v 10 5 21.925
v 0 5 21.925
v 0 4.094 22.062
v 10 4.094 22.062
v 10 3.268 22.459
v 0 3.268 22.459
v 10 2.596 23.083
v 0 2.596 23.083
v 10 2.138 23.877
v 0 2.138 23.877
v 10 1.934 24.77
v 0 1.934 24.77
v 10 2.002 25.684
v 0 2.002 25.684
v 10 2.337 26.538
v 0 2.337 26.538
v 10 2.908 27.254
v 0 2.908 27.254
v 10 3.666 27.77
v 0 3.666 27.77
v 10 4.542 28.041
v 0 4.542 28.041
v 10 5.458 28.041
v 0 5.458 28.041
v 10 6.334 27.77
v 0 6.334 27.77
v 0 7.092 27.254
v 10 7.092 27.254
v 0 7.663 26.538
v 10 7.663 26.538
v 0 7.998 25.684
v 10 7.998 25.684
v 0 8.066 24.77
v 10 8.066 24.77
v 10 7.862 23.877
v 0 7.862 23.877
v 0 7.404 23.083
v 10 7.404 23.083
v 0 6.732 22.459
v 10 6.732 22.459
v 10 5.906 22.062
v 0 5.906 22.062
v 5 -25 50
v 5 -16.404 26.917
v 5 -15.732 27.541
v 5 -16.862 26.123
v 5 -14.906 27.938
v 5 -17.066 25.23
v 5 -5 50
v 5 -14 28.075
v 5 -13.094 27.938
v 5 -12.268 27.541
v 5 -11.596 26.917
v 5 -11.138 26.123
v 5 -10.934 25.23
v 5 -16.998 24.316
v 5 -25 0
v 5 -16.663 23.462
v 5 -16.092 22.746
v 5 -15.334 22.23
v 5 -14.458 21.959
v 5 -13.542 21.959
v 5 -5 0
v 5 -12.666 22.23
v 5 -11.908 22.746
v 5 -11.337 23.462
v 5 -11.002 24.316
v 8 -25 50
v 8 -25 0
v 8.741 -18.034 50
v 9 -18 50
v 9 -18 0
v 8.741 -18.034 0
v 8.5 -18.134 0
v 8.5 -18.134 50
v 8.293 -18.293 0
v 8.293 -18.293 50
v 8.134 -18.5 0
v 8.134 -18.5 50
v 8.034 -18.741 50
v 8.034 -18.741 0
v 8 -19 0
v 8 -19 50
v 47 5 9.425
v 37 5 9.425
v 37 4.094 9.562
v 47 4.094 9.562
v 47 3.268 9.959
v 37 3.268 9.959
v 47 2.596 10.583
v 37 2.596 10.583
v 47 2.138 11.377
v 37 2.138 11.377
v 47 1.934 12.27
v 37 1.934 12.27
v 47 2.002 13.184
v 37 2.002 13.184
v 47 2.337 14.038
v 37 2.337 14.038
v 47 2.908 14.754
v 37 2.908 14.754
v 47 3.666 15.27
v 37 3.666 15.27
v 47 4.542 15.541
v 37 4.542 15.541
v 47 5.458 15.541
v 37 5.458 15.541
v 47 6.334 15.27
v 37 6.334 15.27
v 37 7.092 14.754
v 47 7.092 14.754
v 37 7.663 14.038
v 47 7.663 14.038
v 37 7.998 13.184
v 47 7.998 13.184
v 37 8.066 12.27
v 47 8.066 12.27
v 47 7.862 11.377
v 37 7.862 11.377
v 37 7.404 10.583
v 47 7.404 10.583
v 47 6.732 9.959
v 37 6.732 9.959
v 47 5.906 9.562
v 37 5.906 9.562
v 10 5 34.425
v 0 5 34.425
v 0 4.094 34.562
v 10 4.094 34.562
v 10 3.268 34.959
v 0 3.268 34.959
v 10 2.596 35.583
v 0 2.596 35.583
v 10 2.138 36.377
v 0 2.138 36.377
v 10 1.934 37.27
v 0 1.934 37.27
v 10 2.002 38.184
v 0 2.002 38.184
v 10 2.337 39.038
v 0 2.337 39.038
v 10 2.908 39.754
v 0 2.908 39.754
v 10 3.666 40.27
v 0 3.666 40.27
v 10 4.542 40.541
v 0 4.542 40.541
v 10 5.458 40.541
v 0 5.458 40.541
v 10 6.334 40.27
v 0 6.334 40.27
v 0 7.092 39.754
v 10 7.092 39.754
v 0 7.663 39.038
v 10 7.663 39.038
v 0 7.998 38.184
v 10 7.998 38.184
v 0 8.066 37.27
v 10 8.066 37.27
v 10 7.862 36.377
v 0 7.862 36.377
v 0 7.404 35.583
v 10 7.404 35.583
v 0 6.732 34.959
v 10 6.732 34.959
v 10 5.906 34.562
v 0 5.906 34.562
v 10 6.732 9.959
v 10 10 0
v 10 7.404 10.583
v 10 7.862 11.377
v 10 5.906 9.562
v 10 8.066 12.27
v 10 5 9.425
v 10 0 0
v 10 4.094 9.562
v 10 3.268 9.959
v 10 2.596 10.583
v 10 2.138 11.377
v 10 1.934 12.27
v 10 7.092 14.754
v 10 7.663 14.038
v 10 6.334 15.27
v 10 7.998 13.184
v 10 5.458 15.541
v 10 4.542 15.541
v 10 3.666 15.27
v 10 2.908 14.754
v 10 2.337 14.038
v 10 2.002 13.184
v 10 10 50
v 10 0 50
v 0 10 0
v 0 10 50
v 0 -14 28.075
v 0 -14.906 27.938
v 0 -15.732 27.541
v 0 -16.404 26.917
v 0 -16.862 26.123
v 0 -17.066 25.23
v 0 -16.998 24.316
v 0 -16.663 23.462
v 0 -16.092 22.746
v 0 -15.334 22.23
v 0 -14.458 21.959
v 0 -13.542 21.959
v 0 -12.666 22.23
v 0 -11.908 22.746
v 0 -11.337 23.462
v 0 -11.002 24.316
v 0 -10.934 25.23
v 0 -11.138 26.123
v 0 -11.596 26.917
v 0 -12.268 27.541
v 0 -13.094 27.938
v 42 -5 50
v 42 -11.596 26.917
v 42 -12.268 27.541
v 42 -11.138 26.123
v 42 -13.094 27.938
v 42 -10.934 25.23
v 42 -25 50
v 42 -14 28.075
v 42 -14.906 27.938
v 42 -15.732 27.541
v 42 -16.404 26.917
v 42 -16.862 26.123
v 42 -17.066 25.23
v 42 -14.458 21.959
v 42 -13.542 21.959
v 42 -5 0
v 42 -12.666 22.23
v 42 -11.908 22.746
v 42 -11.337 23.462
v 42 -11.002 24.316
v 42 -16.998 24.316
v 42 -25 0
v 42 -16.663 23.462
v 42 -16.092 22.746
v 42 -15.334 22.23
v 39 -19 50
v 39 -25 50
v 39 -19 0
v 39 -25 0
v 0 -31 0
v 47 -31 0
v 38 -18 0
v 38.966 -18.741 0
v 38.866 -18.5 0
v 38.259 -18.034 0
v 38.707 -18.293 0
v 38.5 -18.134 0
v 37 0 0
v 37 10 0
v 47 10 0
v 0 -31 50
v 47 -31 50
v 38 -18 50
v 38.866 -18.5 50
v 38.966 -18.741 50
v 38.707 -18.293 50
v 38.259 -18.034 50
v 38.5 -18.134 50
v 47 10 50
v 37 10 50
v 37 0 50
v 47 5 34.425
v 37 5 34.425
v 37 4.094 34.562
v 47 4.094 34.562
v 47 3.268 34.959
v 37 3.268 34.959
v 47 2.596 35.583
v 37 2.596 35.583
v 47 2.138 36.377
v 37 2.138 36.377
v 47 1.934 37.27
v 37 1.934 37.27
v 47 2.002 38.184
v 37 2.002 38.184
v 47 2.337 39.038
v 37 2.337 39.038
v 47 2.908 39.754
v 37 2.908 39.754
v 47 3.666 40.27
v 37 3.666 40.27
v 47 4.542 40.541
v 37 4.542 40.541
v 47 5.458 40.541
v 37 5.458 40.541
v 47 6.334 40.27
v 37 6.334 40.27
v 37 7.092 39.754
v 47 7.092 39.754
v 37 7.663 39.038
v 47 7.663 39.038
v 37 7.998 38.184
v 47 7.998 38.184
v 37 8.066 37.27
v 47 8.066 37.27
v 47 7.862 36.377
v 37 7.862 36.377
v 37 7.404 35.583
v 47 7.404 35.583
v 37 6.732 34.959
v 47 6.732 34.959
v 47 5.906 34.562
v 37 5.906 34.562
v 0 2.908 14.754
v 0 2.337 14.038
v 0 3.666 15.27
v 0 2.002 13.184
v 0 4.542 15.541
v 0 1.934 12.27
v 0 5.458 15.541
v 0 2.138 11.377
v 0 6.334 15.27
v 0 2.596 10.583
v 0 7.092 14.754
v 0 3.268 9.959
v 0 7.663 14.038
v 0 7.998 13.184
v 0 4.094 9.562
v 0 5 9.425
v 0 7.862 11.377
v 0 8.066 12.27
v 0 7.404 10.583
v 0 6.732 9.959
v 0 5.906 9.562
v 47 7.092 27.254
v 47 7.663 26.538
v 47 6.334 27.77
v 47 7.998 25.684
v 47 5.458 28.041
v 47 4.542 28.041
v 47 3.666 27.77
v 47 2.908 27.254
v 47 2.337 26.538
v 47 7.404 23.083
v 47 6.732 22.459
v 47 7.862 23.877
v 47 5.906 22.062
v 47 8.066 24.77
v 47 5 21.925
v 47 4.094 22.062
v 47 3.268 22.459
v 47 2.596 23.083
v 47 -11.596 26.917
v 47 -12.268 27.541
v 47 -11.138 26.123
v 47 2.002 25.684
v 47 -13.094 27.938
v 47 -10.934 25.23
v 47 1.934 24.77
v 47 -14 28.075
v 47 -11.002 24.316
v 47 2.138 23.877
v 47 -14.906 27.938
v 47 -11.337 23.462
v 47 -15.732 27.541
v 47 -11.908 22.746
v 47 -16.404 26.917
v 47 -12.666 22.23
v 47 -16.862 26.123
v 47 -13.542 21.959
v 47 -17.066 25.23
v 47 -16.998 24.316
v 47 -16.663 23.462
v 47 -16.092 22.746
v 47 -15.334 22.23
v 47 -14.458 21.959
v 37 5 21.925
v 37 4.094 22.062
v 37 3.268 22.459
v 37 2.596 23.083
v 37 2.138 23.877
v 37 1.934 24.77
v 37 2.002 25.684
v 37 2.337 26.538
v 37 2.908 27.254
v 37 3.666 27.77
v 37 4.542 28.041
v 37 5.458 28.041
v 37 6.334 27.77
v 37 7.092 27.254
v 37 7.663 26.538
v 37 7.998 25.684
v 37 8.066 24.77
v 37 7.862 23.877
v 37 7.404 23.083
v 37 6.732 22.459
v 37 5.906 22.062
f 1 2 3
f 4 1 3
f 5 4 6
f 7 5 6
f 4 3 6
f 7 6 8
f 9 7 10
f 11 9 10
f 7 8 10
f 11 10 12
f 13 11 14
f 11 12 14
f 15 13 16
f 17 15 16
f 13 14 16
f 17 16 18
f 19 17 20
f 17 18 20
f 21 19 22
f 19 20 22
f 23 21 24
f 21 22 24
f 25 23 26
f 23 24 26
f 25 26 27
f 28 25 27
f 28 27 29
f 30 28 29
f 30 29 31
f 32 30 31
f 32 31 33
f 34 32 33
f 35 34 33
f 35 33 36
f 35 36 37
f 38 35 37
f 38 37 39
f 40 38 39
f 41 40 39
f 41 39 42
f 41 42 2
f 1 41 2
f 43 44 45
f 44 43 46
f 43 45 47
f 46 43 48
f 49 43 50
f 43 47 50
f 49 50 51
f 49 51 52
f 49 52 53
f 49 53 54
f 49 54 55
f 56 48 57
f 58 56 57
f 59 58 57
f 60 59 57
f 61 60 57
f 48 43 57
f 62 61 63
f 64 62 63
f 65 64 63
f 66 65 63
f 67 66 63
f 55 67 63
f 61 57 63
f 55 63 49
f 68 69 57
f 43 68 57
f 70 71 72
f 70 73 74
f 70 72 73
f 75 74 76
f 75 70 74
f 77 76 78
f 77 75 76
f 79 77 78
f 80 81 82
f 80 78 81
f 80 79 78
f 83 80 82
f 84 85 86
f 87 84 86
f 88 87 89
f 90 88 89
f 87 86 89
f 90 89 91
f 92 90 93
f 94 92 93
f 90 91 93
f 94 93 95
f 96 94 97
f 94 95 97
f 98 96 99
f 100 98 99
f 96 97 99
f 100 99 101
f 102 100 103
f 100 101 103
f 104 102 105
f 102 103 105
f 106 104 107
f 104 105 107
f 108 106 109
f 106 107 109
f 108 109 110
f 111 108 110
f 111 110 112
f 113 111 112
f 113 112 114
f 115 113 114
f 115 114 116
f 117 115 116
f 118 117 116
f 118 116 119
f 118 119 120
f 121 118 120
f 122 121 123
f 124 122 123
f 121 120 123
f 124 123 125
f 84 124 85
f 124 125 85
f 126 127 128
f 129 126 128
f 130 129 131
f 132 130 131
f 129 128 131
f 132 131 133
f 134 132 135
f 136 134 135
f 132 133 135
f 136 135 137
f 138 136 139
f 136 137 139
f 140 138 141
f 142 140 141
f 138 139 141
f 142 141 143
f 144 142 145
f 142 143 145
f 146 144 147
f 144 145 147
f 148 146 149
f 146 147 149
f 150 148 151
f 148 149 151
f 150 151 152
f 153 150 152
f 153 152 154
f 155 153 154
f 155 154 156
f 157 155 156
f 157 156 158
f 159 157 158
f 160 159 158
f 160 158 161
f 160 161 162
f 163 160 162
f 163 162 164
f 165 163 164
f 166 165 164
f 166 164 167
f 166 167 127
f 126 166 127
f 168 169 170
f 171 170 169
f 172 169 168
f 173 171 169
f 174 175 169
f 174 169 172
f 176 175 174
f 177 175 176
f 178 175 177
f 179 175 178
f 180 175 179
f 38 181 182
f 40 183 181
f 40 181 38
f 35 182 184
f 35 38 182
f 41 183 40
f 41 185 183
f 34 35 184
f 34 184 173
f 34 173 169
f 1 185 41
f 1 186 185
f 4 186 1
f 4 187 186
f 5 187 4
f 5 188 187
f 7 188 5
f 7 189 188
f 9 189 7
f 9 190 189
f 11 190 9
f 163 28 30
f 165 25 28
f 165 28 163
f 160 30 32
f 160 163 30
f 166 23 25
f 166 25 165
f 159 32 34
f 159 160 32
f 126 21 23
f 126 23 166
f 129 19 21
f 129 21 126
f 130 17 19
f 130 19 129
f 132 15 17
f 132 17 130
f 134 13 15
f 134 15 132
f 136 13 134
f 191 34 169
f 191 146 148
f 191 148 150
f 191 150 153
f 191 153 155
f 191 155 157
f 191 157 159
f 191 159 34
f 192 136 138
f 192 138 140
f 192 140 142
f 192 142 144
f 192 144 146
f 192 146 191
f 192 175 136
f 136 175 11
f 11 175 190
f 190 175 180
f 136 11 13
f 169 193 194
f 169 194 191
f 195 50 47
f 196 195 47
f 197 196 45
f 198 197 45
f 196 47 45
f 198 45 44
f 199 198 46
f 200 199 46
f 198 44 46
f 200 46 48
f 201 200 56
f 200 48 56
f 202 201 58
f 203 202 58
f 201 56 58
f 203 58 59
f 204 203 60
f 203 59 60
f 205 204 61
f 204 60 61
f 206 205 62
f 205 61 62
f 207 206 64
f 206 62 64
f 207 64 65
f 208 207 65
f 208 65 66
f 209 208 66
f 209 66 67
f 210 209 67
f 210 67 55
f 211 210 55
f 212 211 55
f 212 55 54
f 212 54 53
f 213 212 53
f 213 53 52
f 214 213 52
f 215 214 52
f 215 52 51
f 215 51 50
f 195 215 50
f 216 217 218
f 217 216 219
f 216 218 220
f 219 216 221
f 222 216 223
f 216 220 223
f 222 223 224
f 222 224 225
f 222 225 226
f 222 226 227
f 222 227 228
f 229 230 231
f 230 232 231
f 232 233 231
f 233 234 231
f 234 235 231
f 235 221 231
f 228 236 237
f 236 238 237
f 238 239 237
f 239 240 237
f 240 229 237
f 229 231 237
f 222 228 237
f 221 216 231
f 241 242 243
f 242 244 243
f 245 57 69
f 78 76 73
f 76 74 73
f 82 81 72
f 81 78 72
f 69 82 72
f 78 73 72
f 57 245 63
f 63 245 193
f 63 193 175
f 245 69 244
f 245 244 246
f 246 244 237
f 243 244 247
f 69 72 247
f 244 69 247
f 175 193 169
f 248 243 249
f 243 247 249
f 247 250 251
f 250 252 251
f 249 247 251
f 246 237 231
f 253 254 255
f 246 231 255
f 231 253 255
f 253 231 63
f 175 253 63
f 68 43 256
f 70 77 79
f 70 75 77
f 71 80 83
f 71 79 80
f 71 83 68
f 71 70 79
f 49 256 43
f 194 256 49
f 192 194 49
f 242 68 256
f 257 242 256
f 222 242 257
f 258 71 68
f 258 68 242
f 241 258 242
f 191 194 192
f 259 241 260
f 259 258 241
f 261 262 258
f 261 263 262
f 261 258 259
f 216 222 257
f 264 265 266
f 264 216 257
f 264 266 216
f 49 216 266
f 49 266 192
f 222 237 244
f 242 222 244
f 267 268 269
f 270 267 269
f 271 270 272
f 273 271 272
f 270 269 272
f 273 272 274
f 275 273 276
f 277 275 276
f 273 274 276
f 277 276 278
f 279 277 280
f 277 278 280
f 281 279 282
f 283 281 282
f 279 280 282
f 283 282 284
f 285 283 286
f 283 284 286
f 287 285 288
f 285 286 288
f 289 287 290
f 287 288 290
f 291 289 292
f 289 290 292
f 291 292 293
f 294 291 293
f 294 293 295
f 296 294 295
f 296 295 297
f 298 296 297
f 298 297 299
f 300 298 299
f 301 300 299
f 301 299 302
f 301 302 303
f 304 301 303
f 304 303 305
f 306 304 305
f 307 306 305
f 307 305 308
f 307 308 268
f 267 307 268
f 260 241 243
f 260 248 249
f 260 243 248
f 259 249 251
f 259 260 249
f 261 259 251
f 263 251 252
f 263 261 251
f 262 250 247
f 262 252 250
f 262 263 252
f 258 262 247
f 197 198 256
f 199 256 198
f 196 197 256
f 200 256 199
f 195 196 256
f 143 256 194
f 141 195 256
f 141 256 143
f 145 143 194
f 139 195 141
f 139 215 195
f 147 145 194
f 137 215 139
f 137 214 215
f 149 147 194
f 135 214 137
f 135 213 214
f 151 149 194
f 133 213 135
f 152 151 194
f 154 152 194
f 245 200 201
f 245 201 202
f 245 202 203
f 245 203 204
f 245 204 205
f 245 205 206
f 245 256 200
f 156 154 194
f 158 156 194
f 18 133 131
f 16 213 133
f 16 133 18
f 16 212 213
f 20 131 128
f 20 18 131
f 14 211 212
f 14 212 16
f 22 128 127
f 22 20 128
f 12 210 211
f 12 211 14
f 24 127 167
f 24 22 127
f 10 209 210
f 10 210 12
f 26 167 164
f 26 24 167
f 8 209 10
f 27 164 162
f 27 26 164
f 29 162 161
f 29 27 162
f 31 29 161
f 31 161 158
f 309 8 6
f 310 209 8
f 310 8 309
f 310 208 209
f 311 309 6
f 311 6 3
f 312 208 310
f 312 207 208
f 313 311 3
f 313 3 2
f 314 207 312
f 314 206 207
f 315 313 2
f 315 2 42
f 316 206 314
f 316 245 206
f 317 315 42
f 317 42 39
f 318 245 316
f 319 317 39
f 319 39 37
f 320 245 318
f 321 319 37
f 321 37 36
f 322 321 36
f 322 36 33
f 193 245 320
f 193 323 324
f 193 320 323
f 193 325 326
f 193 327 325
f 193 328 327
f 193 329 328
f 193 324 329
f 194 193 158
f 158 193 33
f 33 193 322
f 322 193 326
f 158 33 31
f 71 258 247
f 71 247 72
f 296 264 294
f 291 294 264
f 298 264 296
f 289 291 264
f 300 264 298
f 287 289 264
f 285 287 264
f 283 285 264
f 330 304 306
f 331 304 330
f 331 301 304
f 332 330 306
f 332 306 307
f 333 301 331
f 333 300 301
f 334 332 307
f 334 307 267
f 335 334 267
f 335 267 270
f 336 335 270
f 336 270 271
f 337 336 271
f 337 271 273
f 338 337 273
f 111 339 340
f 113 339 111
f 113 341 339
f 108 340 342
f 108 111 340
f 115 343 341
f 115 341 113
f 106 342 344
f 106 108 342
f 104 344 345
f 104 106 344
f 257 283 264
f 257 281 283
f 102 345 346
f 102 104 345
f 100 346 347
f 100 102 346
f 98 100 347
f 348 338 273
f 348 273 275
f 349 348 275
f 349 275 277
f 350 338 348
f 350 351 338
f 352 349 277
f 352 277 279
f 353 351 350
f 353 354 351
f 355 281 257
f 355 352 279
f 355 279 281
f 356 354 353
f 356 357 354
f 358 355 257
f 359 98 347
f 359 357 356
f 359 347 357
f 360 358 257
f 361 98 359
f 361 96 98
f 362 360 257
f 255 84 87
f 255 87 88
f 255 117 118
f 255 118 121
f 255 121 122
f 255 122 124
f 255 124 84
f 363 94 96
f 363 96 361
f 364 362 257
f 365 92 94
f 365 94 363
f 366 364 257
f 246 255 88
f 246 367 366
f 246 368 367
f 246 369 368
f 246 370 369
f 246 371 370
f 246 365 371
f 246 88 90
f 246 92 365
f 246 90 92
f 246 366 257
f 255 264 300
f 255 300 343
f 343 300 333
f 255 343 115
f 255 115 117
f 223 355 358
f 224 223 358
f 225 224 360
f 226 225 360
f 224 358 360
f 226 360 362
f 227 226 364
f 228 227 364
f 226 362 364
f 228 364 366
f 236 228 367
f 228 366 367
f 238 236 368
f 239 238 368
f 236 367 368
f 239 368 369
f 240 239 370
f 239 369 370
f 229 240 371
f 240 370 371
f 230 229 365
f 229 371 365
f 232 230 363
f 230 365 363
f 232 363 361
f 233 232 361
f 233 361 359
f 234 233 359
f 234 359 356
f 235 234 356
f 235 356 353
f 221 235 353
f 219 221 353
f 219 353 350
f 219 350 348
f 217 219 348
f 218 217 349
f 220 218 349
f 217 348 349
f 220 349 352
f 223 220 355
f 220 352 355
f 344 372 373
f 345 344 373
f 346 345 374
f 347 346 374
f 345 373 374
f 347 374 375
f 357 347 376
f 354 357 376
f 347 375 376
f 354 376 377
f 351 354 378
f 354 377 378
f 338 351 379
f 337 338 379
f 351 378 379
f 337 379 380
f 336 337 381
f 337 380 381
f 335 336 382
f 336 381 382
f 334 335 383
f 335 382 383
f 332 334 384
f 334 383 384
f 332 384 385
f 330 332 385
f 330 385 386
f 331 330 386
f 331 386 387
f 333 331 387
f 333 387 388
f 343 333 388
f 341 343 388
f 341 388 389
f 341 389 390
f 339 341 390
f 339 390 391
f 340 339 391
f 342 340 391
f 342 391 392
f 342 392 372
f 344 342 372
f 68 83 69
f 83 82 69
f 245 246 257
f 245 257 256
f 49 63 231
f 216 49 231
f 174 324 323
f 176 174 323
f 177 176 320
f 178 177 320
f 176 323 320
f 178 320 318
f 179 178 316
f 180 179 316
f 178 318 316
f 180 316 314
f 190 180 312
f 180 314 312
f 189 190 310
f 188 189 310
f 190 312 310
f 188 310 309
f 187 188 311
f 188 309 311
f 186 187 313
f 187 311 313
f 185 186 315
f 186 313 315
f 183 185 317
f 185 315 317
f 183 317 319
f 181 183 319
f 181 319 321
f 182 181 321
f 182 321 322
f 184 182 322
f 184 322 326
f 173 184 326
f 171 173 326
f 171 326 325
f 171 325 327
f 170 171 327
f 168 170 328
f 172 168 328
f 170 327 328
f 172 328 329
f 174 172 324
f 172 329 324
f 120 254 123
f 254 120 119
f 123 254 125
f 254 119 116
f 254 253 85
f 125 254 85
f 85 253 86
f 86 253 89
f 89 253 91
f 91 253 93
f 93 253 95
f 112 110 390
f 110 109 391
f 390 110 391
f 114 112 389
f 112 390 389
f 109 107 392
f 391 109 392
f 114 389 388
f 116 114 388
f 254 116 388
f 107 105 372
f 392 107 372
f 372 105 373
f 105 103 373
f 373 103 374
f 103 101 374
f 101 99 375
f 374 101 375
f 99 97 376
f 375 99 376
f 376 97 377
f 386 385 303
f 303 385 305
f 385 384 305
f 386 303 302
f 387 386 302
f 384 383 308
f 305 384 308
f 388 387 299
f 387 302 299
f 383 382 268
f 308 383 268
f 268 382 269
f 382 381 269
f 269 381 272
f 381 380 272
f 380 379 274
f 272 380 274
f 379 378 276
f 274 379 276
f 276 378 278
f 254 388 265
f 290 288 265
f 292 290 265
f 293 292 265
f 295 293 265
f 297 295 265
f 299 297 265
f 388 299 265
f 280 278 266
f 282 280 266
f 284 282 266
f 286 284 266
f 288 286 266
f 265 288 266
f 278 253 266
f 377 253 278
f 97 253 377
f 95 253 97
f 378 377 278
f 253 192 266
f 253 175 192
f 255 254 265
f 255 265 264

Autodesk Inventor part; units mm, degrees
sketch "Skizze1" plane through (0, 0, 0) normal (0, 0, 1) x (1, 0, 0)
  line L0 (-9.4, 0) -> (56.4, 0) projected
  line L1 (0, -37.2) -> (0, 6.2) projected
  line L2 (0, 0) -> (47, 0)
  line L3 (47, 0) -> (47, -31)
  line L4 (47, -31) -> (0, -31)
  line L5 (0, -31) -> (0, 0)
  line L6 (5, -5) -> (42, -5)
  line L7 (42, -5) -> (42, -25)
  line L8 (42, -25) -> (39, -25)
  line L9 (39, -25) -> (39, -18)
  line L10 (39, -18) -> (8, -18)
  line L11 (8, -18) -> (8, -25)
  line L12 (8, -25) -> (5, -25)
  line L13 (5, -25) -> (5, -5)
  dimension "d0" = 47
  dimension "d1" = 31
  dimension "d2" = 5
  dimension "d3" = 5
  dimension "d4" = 5
  dimension "d5" = 6
  dimension "d6" = 6
  dimension "d7" = 3
  dimension "d8" = 3
  dimension "d9" = 13
extrude "Extrusion1" add sketch "Skizze1" along normal blind 50
fillet "Rundung1" radius 1 2 edges at (8, -18, 25) (39, -18, 25)
sketch "Skizze4" plane through (0, -31, 0) normal (-1, 0, 0) x (0, 0, 1)
  line L0 (50, 31) -> (50, 0) projected
  line L1 (0, 31) -> (50, 31) projected
  circle A0 centre (25, 17) radius 1.8
  dimension "d41" = 25
  dimension "d42" = 14
  dimension "d43" = 3.6
hole "Bohrung3" at (0, -14, 25) direction (1, 0, 0) diameter 6.15 end through all
sketch "Skizze5" plane through (0, 0, 0) normal (0, 1, 0) x (1, 0, 0)
  line L0 (0, 0) -> (47, 0) projected
  line L1 (0, 0) -> (10, 0)
  line L2 (10, 0) -> (10, -50)
  line L3 (10, -50) -> (0, -50)
  line L4 (0, -50) -> (0, 0)
  line L5 (47, 0) -> (47, -50) projected
  line L6 (47, 0) -> (37, 0)
  line L7 (37, 0) -> (37, -50)
  line L8 (37, -50) -> (47, -50)
  line L9 (47, -50) -> (47, 0)
  dimension "d51" = 10
  dimension "d52" = 50
  dimension "d53" = 10
  dimension "d54" = 50
extrude "Extrusion4" add sketch "Skizze5" along normal blind 10
sketch "Skizze6" plane through (47, -31, 50) normal (1, 0, 0) x (0, 0, -1)
  line L0 (0, 41) -> (50, 41) projected
  line L1 (50, 41) -> (50, 0) projected
  line L2 (0, 0) -> (0, 41) projected
  point P0 (50, 31)
  point P1 (12.5, 36)
  point P2 (25, 36)
  point P3 (37.5, 36)
  dimension "d57" = 5
  dimension "d58" = 5
  dimension "d59" = 5
  dimension "d60" = 12.5
  dimension "d61" = 12.5
  dimension "d62" = 12.5
hole "Bohrung4" at (47, 5, 37.5) at (47, 5, 25) at (47, 5, 12.5) direction (-1, 0, 0) diameter 6.15 end through all
properties part number "NASA Objektträgerhalter (Südkorea)"
